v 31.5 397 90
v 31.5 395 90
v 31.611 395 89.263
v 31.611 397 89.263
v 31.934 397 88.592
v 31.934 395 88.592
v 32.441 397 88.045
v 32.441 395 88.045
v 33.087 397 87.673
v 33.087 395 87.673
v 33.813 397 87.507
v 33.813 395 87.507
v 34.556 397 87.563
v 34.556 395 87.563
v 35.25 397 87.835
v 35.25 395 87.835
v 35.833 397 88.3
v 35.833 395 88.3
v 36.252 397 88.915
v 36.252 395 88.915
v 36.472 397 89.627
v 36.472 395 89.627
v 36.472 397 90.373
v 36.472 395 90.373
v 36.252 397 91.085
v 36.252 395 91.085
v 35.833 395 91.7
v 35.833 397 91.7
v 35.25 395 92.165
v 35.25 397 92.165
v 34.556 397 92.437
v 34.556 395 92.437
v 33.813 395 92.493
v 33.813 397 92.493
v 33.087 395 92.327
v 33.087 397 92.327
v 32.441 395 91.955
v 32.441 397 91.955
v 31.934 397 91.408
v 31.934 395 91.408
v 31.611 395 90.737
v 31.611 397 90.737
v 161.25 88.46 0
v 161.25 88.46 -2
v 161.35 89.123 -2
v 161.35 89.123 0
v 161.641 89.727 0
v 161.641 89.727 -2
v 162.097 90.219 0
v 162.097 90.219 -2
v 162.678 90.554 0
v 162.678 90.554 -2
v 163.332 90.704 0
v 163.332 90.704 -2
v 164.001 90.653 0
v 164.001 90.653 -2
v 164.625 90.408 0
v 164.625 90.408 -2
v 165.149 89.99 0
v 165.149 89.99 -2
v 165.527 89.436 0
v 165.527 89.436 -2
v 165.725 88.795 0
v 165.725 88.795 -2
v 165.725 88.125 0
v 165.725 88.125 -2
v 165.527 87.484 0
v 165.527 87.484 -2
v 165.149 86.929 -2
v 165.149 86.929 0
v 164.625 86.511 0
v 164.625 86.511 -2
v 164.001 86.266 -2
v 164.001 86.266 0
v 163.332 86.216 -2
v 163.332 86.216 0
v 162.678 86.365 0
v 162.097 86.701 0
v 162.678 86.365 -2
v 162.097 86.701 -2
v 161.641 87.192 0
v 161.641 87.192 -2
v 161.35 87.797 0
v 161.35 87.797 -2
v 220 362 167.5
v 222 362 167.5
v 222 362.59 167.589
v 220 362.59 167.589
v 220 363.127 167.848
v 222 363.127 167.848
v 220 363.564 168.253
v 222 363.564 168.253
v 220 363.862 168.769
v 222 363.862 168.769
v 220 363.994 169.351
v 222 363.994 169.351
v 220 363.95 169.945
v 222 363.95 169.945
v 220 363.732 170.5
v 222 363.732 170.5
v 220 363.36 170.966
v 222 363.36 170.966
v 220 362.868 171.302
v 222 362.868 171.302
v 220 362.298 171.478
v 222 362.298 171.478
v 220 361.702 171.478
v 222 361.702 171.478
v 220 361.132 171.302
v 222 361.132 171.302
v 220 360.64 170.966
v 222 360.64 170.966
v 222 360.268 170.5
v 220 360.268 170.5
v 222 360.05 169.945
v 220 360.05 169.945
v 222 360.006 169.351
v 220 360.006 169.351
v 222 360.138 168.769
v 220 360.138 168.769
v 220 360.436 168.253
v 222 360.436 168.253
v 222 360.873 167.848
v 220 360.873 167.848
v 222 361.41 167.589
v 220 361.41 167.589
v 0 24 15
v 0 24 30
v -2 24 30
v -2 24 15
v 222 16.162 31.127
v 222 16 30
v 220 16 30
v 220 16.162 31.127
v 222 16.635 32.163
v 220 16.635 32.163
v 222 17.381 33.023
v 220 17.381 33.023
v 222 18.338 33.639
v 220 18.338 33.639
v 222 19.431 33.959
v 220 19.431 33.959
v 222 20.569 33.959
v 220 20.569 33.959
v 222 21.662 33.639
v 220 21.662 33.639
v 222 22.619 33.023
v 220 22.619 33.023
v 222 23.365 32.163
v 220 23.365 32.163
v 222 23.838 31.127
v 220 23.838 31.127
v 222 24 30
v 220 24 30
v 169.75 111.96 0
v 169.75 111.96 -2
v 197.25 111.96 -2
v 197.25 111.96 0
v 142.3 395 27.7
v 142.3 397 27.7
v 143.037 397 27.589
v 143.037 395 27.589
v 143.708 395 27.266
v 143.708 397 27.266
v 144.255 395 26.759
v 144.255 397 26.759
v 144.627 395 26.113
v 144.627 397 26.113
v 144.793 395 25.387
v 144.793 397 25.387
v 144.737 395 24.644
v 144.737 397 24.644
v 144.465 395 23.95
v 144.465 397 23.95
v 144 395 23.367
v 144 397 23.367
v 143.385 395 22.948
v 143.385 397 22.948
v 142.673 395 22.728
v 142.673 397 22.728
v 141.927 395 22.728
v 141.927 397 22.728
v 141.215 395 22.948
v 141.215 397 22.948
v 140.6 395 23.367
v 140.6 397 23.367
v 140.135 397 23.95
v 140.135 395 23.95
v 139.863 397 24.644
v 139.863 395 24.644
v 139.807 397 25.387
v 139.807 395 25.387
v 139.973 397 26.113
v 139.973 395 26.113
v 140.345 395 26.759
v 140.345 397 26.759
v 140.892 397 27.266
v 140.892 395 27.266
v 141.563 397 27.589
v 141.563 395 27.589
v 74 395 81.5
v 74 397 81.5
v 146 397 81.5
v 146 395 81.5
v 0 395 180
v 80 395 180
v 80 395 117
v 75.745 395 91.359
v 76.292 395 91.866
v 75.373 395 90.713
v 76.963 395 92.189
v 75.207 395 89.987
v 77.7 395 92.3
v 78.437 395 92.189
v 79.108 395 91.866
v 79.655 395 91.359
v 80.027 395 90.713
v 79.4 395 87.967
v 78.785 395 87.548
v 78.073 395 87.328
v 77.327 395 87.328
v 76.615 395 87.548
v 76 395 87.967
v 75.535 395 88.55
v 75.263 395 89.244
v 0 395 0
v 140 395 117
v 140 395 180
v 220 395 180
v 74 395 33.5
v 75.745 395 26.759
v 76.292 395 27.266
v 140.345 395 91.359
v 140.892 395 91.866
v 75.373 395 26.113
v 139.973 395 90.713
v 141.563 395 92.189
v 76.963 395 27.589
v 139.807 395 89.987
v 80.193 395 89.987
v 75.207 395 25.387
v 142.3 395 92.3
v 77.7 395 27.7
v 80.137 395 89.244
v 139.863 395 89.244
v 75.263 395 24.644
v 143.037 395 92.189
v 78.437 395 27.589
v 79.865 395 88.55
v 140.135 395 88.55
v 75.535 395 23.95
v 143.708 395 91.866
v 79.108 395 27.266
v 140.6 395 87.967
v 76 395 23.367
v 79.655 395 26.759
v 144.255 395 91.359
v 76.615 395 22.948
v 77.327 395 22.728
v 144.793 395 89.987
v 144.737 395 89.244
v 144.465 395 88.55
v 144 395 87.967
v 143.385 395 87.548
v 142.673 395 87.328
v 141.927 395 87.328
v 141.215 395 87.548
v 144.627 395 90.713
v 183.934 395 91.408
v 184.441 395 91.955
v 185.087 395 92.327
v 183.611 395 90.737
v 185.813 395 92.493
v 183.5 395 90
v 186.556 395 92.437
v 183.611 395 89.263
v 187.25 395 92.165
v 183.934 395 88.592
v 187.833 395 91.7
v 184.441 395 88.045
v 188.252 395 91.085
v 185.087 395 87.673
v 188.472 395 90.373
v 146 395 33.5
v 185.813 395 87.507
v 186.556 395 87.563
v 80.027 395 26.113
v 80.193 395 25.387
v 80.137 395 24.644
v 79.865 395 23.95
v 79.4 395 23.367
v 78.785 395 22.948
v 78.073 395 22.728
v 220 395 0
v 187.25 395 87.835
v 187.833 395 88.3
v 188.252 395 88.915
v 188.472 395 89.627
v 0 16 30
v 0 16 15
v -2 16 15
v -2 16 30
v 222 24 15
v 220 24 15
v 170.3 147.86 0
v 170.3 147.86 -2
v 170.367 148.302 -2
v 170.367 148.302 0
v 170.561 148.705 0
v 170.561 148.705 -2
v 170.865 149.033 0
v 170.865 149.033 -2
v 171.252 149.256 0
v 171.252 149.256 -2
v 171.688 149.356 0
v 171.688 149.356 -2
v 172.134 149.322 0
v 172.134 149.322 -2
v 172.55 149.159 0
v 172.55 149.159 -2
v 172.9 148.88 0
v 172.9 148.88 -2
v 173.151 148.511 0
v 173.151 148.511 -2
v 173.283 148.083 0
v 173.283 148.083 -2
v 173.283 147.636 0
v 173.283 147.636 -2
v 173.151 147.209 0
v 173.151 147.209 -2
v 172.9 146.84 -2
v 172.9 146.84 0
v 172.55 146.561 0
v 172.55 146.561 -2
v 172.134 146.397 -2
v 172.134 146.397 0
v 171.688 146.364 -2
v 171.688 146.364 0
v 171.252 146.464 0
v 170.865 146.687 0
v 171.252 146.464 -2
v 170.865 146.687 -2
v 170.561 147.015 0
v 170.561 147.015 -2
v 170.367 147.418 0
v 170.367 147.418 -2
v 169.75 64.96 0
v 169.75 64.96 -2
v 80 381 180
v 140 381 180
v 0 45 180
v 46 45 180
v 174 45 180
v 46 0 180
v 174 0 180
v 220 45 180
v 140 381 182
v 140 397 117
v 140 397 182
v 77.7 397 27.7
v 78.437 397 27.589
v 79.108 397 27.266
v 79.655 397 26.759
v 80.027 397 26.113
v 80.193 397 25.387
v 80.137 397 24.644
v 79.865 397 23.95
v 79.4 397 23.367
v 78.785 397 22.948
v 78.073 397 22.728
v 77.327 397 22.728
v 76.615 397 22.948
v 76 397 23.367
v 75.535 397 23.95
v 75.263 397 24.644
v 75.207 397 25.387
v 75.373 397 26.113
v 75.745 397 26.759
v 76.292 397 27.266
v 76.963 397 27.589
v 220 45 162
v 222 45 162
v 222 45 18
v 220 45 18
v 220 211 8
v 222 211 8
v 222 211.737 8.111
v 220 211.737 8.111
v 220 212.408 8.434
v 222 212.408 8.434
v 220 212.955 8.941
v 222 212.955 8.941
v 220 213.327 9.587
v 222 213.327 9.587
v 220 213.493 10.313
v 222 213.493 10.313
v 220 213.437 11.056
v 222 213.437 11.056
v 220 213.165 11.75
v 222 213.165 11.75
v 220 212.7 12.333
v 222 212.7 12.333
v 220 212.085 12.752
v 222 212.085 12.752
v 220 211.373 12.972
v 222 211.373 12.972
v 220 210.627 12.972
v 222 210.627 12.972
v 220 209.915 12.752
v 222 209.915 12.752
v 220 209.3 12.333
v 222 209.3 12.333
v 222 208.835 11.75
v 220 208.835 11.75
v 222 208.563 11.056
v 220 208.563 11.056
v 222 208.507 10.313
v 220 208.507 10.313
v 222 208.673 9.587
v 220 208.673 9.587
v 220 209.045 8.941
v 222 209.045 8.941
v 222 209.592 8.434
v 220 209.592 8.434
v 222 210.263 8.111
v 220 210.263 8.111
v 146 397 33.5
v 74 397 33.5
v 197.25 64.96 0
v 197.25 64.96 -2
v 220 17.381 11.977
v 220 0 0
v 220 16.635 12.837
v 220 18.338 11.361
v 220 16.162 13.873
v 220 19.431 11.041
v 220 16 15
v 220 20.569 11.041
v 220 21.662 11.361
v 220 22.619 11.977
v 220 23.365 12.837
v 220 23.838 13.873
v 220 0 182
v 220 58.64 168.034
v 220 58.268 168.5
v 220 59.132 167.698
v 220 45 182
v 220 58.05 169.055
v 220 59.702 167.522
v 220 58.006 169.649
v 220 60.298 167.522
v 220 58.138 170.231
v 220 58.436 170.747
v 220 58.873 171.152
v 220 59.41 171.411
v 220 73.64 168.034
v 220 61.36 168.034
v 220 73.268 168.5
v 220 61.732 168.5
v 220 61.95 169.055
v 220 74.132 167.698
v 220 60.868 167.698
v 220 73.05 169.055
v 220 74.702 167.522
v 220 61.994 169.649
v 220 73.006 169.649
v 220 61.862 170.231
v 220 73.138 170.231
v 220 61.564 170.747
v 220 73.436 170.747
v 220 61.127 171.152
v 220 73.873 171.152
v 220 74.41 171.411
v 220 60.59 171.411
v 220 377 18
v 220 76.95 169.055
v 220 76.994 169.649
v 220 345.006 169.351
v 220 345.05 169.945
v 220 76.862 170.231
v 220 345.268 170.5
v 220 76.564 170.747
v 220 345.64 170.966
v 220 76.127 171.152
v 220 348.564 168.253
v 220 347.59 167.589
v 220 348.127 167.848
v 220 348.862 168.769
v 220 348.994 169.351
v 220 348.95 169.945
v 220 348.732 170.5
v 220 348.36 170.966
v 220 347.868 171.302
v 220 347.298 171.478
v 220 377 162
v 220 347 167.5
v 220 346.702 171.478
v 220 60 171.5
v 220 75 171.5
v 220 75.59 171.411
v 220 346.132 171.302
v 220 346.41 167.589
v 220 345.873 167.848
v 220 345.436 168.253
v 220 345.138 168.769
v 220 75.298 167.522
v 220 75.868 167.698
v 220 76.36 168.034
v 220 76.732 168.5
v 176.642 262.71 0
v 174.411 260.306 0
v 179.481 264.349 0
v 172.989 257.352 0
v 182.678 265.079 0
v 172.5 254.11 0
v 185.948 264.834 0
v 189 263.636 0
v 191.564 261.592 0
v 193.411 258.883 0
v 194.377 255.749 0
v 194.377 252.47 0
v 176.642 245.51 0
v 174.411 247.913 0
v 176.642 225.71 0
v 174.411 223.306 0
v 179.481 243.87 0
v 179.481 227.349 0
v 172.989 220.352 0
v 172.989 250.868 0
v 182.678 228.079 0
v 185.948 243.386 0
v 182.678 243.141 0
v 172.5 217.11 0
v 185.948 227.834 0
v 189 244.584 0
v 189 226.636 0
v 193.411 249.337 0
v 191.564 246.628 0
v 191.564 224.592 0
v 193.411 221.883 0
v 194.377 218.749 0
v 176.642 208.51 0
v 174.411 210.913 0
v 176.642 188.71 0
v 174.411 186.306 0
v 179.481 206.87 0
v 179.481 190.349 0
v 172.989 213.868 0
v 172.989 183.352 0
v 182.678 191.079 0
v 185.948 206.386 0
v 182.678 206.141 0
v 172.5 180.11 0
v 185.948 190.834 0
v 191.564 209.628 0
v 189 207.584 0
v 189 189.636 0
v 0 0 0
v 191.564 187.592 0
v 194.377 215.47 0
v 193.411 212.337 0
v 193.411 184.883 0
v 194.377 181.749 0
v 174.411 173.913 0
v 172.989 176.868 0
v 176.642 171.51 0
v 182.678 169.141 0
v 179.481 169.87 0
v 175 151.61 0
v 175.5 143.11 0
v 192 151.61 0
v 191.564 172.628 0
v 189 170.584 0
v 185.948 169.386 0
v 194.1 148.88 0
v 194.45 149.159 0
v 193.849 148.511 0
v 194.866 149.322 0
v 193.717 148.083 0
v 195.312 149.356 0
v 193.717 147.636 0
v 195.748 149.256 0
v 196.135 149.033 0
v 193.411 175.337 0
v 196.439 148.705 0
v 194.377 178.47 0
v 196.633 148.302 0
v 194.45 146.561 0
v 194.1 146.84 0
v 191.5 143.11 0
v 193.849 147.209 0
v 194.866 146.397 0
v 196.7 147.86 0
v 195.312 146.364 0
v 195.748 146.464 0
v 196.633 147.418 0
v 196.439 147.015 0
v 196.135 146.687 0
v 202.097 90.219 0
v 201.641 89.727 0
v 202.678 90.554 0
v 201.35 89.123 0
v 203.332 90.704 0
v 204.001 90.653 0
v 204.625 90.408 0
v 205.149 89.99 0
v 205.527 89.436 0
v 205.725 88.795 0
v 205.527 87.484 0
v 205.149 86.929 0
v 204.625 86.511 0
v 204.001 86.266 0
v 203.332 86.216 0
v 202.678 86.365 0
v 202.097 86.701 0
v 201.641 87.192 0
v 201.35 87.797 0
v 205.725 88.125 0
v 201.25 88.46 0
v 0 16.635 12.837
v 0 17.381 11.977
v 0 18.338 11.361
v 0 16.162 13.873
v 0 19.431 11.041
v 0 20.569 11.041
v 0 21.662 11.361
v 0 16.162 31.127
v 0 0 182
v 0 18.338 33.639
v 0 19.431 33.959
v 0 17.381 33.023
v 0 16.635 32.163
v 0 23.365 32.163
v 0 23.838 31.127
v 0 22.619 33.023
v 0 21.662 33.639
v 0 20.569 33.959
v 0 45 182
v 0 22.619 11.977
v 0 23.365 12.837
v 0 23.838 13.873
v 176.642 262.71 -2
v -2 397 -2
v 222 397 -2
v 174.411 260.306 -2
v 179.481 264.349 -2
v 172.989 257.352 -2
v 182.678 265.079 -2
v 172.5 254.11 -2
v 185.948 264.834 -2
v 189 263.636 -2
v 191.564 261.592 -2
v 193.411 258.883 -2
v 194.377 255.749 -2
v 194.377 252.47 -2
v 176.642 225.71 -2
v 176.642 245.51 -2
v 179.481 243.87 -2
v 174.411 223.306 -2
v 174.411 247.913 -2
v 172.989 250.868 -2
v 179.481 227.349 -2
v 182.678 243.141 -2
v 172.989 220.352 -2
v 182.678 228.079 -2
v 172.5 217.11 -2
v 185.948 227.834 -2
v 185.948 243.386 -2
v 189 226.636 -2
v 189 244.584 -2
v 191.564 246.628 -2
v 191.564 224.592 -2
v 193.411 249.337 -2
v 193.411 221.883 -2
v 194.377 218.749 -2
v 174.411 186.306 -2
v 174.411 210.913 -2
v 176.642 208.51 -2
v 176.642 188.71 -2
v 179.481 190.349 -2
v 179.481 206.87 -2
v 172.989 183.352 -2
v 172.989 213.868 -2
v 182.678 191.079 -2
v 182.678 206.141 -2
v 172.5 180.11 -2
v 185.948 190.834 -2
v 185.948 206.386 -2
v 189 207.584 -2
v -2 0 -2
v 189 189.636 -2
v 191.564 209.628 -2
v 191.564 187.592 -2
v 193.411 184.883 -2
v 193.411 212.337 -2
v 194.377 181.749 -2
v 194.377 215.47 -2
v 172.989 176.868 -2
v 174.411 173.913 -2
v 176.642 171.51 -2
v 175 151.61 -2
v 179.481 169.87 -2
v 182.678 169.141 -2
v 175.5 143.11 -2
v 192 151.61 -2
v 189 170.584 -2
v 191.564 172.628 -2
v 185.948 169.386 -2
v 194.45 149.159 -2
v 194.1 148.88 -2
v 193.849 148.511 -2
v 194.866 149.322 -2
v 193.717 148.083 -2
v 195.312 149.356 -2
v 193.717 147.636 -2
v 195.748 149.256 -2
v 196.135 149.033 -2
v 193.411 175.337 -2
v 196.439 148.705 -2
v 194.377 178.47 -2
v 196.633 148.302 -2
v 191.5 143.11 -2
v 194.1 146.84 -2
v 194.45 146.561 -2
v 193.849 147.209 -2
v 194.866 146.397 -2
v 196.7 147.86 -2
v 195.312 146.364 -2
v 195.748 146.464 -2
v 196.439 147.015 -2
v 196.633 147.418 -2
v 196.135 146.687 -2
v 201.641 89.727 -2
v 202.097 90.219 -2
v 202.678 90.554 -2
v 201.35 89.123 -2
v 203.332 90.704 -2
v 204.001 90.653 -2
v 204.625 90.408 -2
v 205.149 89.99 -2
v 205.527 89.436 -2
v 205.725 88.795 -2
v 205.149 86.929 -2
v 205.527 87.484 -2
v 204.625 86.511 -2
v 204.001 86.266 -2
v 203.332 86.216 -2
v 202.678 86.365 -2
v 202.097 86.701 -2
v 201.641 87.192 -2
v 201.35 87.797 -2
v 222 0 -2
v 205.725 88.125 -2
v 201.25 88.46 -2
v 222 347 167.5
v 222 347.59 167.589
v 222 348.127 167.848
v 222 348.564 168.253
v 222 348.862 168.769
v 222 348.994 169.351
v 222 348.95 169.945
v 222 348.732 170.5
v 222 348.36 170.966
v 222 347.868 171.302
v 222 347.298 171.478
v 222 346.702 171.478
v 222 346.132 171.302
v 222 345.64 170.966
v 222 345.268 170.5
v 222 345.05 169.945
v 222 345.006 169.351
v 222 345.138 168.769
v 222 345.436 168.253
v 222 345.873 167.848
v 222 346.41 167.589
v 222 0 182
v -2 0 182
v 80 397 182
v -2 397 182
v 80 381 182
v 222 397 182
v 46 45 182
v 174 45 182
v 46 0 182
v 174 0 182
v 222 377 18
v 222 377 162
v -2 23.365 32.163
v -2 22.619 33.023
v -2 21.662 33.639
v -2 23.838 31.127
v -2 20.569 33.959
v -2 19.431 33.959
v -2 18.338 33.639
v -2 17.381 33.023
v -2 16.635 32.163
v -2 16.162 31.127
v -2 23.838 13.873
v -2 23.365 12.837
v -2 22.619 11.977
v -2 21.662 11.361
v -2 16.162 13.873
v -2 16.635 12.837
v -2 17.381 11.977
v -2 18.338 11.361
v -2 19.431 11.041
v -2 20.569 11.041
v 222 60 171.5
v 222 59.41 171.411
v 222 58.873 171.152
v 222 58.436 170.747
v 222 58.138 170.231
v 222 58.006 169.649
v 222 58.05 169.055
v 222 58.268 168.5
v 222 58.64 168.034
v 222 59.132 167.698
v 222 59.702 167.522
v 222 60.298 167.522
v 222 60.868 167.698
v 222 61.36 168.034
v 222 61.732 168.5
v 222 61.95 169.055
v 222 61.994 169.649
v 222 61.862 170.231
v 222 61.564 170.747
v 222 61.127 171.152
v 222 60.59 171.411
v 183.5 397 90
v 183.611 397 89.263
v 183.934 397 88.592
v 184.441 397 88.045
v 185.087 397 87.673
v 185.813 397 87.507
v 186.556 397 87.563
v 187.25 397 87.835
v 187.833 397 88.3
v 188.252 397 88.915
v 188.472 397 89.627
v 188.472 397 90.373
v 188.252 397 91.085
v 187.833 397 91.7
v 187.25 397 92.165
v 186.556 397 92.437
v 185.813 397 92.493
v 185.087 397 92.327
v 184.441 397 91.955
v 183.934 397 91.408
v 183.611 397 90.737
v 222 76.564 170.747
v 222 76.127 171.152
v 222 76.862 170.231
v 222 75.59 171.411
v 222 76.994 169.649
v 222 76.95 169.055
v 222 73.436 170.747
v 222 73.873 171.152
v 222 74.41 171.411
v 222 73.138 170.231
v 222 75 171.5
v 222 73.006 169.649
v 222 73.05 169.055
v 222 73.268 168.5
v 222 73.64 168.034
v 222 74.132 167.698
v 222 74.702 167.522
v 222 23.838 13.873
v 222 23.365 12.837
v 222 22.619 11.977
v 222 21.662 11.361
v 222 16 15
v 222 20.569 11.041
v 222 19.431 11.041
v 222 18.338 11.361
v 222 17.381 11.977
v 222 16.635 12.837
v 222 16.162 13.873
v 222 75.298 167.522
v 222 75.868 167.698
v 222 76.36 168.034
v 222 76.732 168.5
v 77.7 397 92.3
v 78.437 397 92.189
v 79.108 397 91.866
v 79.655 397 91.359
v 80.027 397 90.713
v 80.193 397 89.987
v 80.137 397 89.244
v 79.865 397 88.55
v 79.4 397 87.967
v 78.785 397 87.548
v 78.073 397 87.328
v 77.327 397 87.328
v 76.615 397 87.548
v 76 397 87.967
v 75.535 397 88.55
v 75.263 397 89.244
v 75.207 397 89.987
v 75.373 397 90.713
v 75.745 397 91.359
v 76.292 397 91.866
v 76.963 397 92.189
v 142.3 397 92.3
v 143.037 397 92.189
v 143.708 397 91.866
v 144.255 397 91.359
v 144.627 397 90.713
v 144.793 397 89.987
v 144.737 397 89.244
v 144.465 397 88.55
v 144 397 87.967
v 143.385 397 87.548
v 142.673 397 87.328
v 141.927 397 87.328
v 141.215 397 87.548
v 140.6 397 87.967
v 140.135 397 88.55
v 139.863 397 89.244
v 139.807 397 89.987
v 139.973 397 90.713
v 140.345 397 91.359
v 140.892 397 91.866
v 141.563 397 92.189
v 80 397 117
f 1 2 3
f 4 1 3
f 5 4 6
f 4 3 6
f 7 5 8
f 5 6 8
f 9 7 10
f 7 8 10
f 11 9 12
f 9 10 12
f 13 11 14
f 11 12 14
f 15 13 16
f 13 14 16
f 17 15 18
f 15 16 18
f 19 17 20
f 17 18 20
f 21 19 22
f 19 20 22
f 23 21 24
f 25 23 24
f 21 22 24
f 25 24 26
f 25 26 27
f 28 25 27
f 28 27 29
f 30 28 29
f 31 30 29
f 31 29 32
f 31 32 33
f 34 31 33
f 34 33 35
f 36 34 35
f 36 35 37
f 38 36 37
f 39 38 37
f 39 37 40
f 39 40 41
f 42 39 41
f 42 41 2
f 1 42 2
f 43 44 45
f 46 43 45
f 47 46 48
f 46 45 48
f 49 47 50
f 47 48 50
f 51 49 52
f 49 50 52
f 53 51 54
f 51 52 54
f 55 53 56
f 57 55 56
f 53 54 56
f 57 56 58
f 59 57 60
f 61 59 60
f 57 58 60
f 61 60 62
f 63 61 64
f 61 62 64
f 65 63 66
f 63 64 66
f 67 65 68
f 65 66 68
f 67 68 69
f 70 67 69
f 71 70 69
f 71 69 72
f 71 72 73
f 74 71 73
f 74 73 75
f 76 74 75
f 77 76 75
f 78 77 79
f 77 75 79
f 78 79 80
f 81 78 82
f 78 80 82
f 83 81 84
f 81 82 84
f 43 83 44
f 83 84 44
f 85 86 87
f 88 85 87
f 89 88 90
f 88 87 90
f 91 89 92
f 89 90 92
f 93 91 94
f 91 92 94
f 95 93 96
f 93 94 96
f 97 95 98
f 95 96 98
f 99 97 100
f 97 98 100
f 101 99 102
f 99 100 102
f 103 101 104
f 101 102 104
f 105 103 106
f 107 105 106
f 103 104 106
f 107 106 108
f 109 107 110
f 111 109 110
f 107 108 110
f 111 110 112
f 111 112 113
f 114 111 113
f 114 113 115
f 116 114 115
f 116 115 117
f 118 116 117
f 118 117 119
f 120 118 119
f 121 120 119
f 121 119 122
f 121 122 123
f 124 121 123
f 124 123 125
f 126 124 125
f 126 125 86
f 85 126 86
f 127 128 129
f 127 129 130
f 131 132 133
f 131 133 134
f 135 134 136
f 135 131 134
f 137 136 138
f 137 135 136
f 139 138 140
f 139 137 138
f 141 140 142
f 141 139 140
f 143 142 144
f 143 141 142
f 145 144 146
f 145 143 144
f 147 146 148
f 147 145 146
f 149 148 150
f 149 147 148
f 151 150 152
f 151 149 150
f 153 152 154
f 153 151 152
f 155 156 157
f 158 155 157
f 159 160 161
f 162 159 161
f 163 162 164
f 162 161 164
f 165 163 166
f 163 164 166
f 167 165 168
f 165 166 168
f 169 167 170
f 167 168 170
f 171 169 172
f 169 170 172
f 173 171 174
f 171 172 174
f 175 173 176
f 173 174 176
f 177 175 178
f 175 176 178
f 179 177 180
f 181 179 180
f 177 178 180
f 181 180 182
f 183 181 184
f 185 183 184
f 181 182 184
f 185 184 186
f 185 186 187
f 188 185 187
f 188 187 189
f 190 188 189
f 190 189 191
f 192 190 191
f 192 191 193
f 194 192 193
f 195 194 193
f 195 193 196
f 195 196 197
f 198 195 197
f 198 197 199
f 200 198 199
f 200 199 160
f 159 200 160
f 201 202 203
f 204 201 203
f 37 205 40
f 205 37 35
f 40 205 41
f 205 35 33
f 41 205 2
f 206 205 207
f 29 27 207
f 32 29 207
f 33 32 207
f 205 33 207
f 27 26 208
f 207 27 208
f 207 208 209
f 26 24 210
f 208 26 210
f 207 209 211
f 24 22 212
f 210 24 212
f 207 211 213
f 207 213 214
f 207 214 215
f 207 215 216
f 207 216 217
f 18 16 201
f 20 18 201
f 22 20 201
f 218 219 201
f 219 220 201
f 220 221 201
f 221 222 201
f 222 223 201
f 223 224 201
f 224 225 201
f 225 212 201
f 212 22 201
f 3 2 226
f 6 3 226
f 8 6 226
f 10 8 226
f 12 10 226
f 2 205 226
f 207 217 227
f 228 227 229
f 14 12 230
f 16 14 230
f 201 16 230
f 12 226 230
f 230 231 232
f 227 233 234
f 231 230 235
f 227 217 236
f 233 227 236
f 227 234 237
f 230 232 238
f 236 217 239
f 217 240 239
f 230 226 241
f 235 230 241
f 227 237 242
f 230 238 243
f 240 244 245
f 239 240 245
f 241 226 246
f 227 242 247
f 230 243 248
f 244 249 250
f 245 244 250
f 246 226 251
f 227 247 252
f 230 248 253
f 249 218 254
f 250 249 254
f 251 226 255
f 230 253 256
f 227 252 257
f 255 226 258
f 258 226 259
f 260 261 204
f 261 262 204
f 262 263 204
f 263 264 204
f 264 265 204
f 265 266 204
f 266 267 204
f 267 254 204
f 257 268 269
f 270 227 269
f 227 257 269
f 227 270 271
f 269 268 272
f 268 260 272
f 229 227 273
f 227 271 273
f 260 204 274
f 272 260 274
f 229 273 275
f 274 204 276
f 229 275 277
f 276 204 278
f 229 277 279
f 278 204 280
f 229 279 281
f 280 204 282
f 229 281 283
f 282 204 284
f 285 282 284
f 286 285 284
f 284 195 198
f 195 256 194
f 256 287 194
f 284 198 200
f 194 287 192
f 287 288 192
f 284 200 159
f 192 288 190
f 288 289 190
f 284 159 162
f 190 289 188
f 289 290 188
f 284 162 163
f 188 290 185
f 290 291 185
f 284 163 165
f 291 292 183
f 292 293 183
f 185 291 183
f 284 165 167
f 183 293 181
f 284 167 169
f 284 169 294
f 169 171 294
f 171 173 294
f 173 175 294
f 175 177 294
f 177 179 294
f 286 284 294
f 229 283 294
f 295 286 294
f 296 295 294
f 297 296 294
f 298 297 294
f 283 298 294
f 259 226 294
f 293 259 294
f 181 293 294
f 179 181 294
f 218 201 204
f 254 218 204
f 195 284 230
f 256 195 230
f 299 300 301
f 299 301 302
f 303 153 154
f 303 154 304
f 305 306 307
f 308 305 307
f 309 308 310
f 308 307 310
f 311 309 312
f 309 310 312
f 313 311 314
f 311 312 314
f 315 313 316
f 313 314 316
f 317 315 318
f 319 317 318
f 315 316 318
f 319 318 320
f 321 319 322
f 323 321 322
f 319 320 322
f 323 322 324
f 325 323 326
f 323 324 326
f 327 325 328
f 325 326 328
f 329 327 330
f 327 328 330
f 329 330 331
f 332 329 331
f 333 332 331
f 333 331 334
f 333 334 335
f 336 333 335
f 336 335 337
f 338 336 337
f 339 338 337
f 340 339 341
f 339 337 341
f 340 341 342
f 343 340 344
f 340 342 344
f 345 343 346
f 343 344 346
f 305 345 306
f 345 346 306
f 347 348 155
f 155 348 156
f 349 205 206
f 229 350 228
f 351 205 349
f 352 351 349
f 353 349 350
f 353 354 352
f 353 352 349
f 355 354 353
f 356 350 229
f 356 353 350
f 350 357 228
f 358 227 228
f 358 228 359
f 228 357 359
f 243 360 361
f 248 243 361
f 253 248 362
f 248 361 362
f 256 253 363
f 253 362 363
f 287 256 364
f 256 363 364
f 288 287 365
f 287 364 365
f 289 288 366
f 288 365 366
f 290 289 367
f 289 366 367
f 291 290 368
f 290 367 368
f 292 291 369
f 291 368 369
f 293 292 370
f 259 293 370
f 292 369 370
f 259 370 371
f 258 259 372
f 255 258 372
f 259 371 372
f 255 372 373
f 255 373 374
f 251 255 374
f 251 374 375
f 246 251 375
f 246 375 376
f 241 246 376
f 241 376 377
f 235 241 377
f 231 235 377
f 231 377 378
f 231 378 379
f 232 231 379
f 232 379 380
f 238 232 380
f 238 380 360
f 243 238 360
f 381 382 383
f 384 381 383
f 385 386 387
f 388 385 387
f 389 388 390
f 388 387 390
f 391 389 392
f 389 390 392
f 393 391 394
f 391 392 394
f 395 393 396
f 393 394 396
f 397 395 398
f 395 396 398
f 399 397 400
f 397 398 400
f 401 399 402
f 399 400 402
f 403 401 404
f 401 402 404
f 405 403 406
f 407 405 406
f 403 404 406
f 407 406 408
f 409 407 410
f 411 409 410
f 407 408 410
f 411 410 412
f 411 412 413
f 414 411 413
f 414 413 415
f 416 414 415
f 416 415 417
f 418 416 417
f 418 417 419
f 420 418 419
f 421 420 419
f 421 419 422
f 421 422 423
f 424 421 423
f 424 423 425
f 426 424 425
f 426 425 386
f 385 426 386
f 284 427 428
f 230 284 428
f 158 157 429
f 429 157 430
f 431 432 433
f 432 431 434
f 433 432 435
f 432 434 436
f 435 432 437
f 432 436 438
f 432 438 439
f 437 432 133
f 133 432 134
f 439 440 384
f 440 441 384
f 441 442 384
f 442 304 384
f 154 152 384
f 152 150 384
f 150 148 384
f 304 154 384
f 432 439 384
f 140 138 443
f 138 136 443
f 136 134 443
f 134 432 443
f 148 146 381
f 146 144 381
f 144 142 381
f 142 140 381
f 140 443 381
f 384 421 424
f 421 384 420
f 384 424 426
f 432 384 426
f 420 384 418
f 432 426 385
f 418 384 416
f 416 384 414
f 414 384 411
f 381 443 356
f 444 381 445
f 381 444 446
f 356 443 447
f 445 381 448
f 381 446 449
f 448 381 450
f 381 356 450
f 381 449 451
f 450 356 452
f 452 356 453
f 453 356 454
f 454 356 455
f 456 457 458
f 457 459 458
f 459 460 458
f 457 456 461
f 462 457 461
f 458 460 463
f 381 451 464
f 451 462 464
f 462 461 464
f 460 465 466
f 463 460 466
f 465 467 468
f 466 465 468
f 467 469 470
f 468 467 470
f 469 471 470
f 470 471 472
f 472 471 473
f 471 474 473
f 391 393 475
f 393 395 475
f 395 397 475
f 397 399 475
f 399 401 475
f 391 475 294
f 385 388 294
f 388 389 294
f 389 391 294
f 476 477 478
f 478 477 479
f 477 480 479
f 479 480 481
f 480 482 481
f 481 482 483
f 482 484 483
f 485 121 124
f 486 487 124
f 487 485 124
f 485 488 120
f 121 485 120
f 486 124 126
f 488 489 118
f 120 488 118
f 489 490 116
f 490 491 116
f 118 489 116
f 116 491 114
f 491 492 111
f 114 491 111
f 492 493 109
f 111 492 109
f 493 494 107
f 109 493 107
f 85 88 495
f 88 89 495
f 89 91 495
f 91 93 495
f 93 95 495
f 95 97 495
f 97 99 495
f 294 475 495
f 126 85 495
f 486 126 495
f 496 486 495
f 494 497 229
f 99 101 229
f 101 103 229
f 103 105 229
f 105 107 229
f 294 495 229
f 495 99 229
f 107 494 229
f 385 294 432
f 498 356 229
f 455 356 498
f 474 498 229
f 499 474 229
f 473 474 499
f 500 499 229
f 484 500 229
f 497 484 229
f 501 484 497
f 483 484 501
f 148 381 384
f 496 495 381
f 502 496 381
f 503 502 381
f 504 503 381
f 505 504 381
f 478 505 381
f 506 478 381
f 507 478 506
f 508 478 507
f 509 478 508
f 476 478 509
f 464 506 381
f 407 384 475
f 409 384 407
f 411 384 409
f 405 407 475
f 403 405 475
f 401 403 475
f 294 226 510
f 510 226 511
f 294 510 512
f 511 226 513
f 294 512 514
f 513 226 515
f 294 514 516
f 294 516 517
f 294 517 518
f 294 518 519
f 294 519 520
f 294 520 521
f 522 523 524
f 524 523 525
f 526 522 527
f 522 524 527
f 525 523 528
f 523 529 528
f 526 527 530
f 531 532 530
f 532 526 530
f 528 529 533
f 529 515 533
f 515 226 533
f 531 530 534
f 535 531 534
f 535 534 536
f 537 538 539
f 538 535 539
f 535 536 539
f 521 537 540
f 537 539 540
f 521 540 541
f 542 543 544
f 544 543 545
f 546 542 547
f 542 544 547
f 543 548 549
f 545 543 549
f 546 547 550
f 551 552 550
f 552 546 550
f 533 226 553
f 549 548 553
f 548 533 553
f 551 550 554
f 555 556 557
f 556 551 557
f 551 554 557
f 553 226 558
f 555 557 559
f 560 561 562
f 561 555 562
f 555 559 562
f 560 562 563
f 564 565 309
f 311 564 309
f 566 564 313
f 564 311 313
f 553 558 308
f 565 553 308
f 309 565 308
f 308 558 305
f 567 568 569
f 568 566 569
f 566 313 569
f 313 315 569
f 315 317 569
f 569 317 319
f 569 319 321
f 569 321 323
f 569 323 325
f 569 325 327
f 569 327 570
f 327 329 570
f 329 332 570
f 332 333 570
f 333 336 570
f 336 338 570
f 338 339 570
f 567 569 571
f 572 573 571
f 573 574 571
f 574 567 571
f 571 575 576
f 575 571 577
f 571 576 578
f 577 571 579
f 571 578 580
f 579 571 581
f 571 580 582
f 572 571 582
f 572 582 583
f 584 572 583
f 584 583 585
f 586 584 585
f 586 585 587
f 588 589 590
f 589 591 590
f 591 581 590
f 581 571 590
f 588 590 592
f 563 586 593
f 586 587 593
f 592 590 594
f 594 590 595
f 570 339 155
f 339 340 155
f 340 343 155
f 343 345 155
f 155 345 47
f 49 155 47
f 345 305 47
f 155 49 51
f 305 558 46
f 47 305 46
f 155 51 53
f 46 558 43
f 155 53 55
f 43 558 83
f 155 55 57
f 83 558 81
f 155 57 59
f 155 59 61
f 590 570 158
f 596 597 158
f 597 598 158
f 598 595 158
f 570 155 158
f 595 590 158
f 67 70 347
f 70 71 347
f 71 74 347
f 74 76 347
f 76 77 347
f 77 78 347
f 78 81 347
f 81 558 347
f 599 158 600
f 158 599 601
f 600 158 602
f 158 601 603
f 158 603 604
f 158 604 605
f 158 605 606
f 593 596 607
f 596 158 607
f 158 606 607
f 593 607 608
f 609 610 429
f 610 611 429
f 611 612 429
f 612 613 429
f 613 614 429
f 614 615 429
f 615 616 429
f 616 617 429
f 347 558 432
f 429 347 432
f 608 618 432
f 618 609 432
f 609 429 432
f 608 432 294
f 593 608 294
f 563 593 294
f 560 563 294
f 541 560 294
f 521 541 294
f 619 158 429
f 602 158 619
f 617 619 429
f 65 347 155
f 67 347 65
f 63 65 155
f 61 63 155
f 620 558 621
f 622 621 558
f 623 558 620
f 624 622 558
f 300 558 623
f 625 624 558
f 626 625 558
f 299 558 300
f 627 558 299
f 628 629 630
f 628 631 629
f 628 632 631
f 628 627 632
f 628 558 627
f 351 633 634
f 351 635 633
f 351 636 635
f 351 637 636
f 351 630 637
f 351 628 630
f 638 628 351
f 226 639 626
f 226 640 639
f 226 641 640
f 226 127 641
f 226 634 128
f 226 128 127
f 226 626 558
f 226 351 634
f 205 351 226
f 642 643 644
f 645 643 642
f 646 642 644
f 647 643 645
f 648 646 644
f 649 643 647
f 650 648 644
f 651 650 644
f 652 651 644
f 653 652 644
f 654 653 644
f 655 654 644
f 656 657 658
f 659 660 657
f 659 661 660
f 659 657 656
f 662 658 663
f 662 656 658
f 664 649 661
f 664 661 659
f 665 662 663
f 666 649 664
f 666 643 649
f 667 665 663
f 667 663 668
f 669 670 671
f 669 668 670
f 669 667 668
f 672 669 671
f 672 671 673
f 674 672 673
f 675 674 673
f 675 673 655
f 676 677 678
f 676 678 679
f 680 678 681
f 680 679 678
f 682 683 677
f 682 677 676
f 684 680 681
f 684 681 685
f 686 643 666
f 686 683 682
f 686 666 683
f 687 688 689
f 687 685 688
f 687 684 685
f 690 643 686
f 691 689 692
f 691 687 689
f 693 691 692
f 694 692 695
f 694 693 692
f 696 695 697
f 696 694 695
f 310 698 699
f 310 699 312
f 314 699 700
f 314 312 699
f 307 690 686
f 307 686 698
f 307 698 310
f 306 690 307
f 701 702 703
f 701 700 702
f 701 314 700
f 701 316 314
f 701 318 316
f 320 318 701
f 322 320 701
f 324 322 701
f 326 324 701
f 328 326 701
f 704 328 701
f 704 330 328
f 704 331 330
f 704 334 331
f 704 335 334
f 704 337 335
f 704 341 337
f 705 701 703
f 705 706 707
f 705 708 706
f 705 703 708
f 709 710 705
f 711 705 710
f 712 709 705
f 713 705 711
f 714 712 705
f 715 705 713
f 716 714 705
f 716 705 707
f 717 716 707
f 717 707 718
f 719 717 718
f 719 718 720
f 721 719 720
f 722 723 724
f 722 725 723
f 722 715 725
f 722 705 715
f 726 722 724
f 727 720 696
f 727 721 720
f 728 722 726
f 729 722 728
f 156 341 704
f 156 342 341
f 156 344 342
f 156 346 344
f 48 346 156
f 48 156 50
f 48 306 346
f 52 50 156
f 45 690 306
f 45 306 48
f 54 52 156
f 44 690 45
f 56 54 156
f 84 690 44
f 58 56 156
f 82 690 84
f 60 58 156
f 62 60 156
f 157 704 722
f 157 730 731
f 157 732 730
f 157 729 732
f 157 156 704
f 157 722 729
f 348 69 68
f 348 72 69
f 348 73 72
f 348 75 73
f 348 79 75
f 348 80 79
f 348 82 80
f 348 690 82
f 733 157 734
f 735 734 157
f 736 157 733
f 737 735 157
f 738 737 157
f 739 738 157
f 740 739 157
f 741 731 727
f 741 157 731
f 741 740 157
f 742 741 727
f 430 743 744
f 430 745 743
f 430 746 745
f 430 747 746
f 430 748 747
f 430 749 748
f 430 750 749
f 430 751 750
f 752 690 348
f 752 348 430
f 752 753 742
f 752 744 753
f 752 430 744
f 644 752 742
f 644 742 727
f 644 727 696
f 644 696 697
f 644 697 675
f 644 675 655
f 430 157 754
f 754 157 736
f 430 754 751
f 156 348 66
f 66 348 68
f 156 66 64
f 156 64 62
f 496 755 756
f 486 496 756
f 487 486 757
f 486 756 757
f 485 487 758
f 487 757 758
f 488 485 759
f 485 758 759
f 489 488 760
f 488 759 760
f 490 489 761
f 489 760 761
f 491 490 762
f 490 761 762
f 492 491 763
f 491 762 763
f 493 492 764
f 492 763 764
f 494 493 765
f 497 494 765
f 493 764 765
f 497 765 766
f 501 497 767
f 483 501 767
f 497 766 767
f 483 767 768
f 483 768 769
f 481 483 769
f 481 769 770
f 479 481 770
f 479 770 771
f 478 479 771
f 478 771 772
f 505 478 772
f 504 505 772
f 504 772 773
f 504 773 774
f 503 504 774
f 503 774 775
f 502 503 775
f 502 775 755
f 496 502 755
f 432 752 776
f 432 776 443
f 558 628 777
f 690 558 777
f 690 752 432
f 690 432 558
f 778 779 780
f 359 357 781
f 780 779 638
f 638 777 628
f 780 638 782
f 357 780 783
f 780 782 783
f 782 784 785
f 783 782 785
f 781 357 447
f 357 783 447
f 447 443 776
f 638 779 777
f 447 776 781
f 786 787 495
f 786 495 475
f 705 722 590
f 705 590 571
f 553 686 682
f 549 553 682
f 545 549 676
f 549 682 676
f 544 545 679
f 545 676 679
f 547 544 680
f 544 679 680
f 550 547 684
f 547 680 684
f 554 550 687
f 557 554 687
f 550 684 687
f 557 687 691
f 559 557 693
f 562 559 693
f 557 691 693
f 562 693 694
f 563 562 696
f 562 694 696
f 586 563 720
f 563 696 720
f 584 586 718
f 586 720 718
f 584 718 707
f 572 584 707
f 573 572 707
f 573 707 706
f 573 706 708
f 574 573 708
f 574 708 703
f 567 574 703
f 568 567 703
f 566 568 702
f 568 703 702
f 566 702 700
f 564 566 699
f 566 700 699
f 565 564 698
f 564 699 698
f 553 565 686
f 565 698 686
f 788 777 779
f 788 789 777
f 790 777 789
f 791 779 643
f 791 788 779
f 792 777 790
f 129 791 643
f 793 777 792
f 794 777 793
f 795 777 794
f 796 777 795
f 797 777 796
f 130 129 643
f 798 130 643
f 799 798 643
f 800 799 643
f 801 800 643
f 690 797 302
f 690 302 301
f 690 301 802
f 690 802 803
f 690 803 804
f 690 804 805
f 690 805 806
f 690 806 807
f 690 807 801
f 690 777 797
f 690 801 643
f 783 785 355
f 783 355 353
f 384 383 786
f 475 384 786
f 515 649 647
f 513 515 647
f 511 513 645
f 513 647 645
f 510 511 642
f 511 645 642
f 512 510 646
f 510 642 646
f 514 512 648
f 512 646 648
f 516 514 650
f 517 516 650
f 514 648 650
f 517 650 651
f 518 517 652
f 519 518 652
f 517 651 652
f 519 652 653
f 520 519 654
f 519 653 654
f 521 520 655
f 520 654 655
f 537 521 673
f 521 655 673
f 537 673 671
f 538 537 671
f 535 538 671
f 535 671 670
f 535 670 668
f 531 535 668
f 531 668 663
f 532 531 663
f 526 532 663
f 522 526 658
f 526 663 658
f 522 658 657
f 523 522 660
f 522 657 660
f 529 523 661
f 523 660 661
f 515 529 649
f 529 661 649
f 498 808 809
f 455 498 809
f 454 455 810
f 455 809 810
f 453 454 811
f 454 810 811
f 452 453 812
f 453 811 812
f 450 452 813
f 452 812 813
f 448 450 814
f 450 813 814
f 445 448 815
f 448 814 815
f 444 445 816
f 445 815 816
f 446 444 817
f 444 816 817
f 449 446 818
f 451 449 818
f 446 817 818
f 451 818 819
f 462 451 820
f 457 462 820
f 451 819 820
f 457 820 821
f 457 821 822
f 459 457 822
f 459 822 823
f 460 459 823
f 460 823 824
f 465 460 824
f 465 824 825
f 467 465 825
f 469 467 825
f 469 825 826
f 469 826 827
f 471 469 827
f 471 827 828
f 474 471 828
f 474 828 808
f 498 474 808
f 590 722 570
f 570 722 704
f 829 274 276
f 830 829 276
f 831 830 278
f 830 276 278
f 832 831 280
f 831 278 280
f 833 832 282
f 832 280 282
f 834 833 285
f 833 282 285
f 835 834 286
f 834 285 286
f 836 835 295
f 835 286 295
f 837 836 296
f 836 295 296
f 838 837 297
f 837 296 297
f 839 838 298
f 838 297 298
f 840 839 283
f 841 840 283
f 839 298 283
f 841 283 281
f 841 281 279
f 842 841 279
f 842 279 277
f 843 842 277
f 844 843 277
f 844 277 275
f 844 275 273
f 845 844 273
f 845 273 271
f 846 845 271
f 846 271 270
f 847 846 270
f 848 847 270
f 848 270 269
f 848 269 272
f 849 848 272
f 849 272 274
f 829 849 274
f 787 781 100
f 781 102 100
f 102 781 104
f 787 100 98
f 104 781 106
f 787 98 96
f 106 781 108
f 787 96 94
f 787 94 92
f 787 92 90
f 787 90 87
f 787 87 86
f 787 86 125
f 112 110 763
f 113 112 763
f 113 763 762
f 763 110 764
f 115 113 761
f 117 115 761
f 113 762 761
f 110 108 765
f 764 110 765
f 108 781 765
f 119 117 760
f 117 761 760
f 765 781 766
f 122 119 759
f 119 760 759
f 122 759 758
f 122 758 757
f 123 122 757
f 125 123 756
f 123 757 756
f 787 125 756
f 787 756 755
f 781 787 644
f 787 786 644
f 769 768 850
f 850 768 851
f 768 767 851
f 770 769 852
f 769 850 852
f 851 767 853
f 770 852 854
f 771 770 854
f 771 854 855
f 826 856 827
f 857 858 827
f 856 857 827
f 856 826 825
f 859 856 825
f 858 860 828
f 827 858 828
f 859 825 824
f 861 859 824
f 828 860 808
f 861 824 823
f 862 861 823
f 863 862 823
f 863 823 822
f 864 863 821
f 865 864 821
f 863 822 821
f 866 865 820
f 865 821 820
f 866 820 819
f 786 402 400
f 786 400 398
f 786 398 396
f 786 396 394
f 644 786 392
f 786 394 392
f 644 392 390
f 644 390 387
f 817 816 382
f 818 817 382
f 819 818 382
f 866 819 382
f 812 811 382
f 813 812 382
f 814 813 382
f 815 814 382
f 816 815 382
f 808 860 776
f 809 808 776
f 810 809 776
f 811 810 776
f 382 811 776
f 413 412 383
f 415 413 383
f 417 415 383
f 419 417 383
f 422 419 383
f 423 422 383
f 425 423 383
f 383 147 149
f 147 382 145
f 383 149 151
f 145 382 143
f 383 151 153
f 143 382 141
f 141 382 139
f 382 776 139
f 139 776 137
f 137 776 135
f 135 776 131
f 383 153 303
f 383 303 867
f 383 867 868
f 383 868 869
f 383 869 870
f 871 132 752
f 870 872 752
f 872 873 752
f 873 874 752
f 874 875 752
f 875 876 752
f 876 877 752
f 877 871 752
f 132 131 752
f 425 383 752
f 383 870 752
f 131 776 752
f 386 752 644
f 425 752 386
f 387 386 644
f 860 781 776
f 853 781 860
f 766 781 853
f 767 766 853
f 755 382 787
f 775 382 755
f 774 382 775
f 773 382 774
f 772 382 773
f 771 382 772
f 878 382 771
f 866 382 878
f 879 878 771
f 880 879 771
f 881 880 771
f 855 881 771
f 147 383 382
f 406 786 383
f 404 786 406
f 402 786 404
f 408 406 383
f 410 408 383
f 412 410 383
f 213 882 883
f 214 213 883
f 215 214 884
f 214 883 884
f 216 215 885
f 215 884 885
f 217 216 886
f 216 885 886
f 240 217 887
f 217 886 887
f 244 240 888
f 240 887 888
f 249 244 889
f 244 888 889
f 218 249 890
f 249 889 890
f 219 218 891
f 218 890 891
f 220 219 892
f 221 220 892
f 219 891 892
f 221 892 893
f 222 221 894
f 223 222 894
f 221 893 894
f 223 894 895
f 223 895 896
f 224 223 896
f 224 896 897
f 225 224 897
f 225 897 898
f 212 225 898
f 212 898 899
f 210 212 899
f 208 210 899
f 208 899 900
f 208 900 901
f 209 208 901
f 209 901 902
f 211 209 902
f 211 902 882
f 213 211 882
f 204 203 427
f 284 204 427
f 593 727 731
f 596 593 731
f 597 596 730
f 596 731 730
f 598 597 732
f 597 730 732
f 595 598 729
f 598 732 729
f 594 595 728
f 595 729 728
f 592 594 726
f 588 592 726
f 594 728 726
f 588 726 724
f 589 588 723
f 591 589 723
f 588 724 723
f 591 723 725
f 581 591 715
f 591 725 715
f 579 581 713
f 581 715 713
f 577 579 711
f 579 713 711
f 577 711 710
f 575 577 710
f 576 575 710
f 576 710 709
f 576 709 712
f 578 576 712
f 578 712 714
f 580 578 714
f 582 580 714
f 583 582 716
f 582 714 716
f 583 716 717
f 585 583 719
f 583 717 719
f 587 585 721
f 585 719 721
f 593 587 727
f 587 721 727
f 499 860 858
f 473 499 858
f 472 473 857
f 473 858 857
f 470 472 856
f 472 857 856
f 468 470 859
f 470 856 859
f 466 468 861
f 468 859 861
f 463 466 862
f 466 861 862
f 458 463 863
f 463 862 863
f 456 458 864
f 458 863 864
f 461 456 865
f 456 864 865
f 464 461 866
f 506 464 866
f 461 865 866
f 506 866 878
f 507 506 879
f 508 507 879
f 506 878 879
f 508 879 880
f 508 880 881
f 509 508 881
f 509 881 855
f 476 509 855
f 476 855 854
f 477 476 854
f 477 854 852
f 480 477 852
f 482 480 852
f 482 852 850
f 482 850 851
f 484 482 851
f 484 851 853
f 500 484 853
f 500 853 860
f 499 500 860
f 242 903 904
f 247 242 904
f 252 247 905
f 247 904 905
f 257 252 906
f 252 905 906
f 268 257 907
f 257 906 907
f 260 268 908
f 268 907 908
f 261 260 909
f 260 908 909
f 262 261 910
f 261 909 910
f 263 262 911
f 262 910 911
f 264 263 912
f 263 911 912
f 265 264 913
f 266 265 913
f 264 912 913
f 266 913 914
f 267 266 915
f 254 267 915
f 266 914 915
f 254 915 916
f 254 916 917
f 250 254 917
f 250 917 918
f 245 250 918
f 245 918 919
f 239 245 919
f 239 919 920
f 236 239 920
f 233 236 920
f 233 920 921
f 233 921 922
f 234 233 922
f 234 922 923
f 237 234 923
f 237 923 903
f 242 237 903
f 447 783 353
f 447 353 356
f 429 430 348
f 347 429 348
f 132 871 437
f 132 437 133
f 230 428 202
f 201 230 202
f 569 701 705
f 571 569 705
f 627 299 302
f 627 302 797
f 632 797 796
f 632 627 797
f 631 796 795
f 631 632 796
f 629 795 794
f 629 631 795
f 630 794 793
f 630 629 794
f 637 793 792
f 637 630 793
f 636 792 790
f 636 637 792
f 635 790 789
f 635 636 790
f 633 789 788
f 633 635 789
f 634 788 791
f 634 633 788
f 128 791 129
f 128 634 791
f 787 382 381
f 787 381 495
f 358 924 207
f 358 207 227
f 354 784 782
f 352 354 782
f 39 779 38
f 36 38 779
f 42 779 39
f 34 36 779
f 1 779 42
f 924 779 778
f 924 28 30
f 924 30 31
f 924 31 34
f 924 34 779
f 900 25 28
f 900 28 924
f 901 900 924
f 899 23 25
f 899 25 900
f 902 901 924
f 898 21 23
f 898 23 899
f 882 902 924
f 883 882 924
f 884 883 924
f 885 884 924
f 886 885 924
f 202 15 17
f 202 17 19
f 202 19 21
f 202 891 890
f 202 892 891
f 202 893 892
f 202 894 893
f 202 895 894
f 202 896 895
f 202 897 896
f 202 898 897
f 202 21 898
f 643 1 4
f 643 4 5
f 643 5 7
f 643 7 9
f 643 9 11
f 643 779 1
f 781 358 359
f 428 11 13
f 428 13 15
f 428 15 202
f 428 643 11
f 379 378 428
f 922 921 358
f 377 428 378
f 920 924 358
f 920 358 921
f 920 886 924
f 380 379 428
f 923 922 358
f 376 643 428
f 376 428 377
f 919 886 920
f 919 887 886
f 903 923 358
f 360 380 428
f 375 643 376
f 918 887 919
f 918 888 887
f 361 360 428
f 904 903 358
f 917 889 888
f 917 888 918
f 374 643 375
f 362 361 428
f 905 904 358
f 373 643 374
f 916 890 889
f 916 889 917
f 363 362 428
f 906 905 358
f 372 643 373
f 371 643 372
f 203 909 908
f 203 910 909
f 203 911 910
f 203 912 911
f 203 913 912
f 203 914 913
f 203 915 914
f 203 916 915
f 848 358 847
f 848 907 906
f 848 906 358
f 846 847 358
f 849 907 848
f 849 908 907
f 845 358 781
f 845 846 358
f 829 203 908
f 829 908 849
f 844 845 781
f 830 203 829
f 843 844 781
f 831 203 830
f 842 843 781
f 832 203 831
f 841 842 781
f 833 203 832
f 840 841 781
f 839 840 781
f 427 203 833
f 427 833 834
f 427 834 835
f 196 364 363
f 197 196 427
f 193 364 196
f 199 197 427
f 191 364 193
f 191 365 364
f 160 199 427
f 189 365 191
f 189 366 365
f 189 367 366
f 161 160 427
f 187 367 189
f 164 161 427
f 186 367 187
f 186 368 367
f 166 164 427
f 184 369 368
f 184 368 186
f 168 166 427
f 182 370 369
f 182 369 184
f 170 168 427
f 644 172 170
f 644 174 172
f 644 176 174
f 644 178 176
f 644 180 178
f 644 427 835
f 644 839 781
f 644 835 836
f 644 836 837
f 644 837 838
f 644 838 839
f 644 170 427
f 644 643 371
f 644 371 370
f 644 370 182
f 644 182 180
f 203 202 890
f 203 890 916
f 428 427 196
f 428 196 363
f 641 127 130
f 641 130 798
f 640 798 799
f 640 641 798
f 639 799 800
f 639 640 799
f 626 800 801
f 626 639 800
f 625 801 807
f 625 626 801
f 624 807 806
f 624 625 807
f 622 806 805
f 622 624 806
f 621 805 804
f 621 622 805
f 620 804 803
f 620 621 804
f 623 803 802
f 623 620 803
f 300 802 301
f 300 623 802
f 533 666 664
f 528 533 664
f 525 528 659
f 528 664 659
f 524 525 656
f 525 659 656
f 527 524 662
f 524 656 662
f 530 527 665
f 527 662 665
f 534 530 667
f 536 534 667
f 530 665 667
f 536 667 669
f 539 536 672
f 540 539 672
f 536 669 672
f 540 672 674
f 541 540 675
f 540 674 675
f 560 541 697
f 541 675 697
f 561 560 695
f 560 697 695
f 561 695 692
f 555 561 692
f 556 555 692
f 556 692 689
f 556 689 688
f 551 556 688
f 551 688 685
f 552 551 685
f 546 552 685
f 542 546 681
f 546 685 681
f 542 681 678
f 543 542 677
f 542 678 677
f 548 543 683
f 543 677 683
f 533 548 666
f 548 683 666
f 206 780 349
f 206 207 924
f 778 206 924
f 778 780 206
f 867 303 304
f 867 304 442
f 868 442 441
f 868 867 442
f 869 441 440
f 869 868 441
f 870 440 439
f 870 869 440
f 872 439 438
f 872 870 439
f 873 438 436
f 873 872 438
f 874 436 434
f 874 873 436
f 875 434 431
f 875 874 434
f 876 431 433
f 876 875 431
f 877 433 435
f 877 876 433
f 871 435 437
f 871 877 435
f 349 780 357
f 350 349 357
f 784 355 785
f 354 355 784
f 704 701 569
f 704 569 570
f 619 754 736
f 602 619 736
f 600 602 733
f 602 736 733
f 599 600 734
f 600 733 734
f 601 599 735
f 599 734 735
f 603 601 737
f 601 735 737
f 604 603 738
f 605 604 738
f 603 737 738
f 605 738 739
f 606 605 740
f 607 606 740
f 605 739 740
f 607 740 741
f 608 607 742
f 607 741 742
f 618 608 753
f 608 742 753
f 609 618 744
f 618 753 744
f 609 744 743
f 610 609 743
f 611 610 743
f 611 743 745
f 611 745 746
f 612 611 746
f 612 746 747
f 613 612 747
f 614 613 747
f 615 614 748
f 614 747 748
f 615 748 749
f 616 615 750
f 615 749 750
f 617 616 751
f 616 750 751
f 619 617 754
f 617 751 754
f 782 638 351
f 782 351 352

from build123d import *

# Parameters (mm, degrees)
SKETCH_1_W          = 220
SKETCH_1_H          = 180
EXTRUDE_1_DEPTH     = 395
SKETCH_17_W         = 46
SKETCH_17_H         = 45
CUT_EXTRUDE_2_DEPTH = 2
SKETCH_19_W         = 224
SKETCH_19_H         = 184
EXTRUDE_13_DEPTH    = 2
SKETCH_20_W         = 60
SKETCH_20_H         = 18
CUT_EXTRUDE_4_DEPTH = 65
SKETCH_21_W         = 144
SKETCH_21_H         = 332
CUT_EXTRUDE_5_DEPTH = 2
SKETCH_22_R         = 2.5
CUT_EXTRUDE_6_DEPTH = 10
SKETCH_23_R         = 11
SKETCH_23_R_2       = 2.25
SKETCH_23_R_3       = 1.5
CUT_EXTRUDE_7_DEPTH = 2
SKETCH_24_R         = 2
SKETCH_24_R_2       = 2.5
CUT_EXTRUDE_8_DEPTH = 3
CUT_EXTRUDE_9_DEPTH = 491.824815999
HOLE_WIZARD_M6_1_D  = 5


with BuildPart() as part:
    # 草图1 → 凸台-拉伸1 (new body)
    with BuildSketch(Plane(origin=(0, 0, 0), x_dir=(1, 0, 0), z_dir=(0, 1, 0))):
        Polygon((222, 2), (222, -182), (173, -182), (47, -182), (-2, -182), (-2, 2), align=None)
        with Locations((110, -90)):
            Rectangle(SKETCH_1_W, SKETCH_1_H, mode=Mode.SUBTRACT)
    extrude(amount=EXTRUDE_1_DEPTH)

    # 草图17 → 切除-拉伸2 (cut)
    with BuildSketch(Plane.XY.offset(182)):
        with Locations((23, 22.5)):
            Rectangle(SKETCH_17_W, SKETCH_17_H)
        with Locations((197, 22.5)):
            Rectangle(SKETCH_17_W, SKETCH_17_H)
    extrude(amount=-CUT_EXTRUDE_2_DEPTH, mode=Mode.SUBTRACT)

    # 草图19 → 凸台-拉伸13 (add)
    with BuildSketch(Plane(origin=(0, 395, 0), x_dir=(1, 0, 0), z_dir=(0, 1, 0))):
        with Locations((110, -90)):
            Rectangle(SKETCH_19_W, SKETCH_19_H)
    extrude(amount=EXTRUDE_13_DEPTH)

    # 草图20 → 切除-拉伸4 (cut)
    with BuildSketch(Plane.XY.offset(182)):
        with Locations((110, 390)):
            Rectangle(SKETCH_20_W, SKETCH_20_H)
    extrude(amount=-CUT_EXTRUDE_4_DEPTH, mode=Mode.SUBTRACT)

    # 草图21 → 切除-拉伸5 (cut)
    with BuildSketch(Plane(origin=(222, 0, 0), x_dir=(0, 0, -1), z_dir=(1, 0, 0))):
        with Locations((-90, 211)):
            Rectangle(SKETCH_21_W, SKETCH_21_H)
    extrude(amount=-CUT_EXTRUDE_5_DEPTH, mode=Mode.SUBTRACT)

    # 草图22 → 切除-拉伸6 (cut)
    with BuildSketch(Plane(origin=(0, 397, 0), x_dir=(1, 0, 0), z_dir=(0, 1, 0))):
        with Locations(Location((77.7, -25.2, 0), (0, 0, 270))):
            Circle(SKETCH_22_R)
        with Locations(Location((77.7, -89.8, 0), (0, 0, 270))):
            Circle(SKETCH_22_R)
        with Locations(Location((142.3, -89.8, 0), (0, 0, 270))):
            Circle(SKETCH_22_R)
        with Locations(Location((142.3, -25.2, 0), (0, 0, 270))):
            Circle(SKETCH_22_R)
        Polygon((74, -57.5), (74, -81.5), (146, -81.5), (146, -33.5), (74, -33.5), align=None)
    extrude(amount=-CUT_EXTRUDE_6_DEPTH, mode=Mode.SUBTRACT)

    # 草图23 → 切除-拉伸7 (cut)
    with BuildSketch(Plane(origin=(0, 0, -2), x_dir=(-1, 0, 0), z_dir=(0, 0, -1))):
        with Locations((-183.5, 217.109875683)):
            Circle(SKETCH_23_R)
        with Locations((-203.5, 88.459875683)):
            Circle(SKETCH_23_R_2)
        with Locations((-163.5, 88.459875683)):
            Circle(SKETCH_23_R_2)
        with Locations((-183.5, 180.109875683)):
            Circle(SKETCH_23_R)
        with Locations((-183.5, 254.109875683)):
            Circle(SKETCH_23_R)
        with Locations((-171.8, 147.859875683)):
            Circle(SKETCH_23_R_3)
        with Locations(Location((-195.2, 147.859875683, 0), (0, 0, 180))):
            Circle(SKETCH_23_R_3)
        Polygon((-183.5, 111.959875683), (-197.25, 111.959875683), (-197.25, 64.959875683), (-169.75, 64.959875683), (-169.75, 111.959875683), align=None)
        Polygon((-183.5, 151.609875683), (-175, 151.609875683), (-175.5, 143.109875683), (-183.5, 143.109875683), (-191.5, 143.109875683), (-192, 151.609875683), align=None)
    extrude(amount=-CUT_EXTRUDE_7_DEPTH, mode=Mode.SUBTRACT)

    # 草图24 → 切除-拉伸8 (cut)
    with BuildSketch(Plane(origin=(222, 0, 0), x_dir=(0, 0, -1), z_dir=(1, 0, 0))):
        with Locations((-169.5, 362)):
            Circle(SKETCH_24_R)
        with Locations((-169.5, 347)):
            Circle(SKETCH_24_R)
        with Locations(Location((-169.5, 75, 0), (0, 0, 180))):
            Circle(SKETCH_24_R)
        with Locations(Location((-169.5, 60, 0), (0, 0, 180))):
            Circle(SKETCH_24_R)
        with Locations((-10.5, 211)):
            Circle(SKETCH_24_R_2)
    extrude(amount=-CUT_EXTRUDE_8_DEPTH, mode=Mode.SUBTRACT)

    # 草图25 → 切除-拉伸9 (cut, through all)
    with BuildSketch(Plane(origin=(222, 0, 0), x_dir=(0, 0, -1), z_dir=(1, 0, 0))):
        with BuildLine():
            Line((-15, 16), (-30, 16))
            ThreePointArc((-30, 16), (-34, 20), (-30, 24))
            Line((-30, 24), (-15, 24))
            ThreePointArc((-15, 24), (-11, 20), (-15, 16))
        make_face()
    extrude(amount=-CUT_EXTRUDE_9_DEPTH, mode=Mode.SUBTRACT)

    # M6 螺纹孔1 (through all)
    with Locations(Plane(origin=(0, 397, 0), x_dir=(1, 0, 0), z_dir=(0, 1, 0))):
        with Locations((186, -90), (34, -90)):
            Hole(HOLE_WIZARD_M6_1_D / 2)


solid = part.part
